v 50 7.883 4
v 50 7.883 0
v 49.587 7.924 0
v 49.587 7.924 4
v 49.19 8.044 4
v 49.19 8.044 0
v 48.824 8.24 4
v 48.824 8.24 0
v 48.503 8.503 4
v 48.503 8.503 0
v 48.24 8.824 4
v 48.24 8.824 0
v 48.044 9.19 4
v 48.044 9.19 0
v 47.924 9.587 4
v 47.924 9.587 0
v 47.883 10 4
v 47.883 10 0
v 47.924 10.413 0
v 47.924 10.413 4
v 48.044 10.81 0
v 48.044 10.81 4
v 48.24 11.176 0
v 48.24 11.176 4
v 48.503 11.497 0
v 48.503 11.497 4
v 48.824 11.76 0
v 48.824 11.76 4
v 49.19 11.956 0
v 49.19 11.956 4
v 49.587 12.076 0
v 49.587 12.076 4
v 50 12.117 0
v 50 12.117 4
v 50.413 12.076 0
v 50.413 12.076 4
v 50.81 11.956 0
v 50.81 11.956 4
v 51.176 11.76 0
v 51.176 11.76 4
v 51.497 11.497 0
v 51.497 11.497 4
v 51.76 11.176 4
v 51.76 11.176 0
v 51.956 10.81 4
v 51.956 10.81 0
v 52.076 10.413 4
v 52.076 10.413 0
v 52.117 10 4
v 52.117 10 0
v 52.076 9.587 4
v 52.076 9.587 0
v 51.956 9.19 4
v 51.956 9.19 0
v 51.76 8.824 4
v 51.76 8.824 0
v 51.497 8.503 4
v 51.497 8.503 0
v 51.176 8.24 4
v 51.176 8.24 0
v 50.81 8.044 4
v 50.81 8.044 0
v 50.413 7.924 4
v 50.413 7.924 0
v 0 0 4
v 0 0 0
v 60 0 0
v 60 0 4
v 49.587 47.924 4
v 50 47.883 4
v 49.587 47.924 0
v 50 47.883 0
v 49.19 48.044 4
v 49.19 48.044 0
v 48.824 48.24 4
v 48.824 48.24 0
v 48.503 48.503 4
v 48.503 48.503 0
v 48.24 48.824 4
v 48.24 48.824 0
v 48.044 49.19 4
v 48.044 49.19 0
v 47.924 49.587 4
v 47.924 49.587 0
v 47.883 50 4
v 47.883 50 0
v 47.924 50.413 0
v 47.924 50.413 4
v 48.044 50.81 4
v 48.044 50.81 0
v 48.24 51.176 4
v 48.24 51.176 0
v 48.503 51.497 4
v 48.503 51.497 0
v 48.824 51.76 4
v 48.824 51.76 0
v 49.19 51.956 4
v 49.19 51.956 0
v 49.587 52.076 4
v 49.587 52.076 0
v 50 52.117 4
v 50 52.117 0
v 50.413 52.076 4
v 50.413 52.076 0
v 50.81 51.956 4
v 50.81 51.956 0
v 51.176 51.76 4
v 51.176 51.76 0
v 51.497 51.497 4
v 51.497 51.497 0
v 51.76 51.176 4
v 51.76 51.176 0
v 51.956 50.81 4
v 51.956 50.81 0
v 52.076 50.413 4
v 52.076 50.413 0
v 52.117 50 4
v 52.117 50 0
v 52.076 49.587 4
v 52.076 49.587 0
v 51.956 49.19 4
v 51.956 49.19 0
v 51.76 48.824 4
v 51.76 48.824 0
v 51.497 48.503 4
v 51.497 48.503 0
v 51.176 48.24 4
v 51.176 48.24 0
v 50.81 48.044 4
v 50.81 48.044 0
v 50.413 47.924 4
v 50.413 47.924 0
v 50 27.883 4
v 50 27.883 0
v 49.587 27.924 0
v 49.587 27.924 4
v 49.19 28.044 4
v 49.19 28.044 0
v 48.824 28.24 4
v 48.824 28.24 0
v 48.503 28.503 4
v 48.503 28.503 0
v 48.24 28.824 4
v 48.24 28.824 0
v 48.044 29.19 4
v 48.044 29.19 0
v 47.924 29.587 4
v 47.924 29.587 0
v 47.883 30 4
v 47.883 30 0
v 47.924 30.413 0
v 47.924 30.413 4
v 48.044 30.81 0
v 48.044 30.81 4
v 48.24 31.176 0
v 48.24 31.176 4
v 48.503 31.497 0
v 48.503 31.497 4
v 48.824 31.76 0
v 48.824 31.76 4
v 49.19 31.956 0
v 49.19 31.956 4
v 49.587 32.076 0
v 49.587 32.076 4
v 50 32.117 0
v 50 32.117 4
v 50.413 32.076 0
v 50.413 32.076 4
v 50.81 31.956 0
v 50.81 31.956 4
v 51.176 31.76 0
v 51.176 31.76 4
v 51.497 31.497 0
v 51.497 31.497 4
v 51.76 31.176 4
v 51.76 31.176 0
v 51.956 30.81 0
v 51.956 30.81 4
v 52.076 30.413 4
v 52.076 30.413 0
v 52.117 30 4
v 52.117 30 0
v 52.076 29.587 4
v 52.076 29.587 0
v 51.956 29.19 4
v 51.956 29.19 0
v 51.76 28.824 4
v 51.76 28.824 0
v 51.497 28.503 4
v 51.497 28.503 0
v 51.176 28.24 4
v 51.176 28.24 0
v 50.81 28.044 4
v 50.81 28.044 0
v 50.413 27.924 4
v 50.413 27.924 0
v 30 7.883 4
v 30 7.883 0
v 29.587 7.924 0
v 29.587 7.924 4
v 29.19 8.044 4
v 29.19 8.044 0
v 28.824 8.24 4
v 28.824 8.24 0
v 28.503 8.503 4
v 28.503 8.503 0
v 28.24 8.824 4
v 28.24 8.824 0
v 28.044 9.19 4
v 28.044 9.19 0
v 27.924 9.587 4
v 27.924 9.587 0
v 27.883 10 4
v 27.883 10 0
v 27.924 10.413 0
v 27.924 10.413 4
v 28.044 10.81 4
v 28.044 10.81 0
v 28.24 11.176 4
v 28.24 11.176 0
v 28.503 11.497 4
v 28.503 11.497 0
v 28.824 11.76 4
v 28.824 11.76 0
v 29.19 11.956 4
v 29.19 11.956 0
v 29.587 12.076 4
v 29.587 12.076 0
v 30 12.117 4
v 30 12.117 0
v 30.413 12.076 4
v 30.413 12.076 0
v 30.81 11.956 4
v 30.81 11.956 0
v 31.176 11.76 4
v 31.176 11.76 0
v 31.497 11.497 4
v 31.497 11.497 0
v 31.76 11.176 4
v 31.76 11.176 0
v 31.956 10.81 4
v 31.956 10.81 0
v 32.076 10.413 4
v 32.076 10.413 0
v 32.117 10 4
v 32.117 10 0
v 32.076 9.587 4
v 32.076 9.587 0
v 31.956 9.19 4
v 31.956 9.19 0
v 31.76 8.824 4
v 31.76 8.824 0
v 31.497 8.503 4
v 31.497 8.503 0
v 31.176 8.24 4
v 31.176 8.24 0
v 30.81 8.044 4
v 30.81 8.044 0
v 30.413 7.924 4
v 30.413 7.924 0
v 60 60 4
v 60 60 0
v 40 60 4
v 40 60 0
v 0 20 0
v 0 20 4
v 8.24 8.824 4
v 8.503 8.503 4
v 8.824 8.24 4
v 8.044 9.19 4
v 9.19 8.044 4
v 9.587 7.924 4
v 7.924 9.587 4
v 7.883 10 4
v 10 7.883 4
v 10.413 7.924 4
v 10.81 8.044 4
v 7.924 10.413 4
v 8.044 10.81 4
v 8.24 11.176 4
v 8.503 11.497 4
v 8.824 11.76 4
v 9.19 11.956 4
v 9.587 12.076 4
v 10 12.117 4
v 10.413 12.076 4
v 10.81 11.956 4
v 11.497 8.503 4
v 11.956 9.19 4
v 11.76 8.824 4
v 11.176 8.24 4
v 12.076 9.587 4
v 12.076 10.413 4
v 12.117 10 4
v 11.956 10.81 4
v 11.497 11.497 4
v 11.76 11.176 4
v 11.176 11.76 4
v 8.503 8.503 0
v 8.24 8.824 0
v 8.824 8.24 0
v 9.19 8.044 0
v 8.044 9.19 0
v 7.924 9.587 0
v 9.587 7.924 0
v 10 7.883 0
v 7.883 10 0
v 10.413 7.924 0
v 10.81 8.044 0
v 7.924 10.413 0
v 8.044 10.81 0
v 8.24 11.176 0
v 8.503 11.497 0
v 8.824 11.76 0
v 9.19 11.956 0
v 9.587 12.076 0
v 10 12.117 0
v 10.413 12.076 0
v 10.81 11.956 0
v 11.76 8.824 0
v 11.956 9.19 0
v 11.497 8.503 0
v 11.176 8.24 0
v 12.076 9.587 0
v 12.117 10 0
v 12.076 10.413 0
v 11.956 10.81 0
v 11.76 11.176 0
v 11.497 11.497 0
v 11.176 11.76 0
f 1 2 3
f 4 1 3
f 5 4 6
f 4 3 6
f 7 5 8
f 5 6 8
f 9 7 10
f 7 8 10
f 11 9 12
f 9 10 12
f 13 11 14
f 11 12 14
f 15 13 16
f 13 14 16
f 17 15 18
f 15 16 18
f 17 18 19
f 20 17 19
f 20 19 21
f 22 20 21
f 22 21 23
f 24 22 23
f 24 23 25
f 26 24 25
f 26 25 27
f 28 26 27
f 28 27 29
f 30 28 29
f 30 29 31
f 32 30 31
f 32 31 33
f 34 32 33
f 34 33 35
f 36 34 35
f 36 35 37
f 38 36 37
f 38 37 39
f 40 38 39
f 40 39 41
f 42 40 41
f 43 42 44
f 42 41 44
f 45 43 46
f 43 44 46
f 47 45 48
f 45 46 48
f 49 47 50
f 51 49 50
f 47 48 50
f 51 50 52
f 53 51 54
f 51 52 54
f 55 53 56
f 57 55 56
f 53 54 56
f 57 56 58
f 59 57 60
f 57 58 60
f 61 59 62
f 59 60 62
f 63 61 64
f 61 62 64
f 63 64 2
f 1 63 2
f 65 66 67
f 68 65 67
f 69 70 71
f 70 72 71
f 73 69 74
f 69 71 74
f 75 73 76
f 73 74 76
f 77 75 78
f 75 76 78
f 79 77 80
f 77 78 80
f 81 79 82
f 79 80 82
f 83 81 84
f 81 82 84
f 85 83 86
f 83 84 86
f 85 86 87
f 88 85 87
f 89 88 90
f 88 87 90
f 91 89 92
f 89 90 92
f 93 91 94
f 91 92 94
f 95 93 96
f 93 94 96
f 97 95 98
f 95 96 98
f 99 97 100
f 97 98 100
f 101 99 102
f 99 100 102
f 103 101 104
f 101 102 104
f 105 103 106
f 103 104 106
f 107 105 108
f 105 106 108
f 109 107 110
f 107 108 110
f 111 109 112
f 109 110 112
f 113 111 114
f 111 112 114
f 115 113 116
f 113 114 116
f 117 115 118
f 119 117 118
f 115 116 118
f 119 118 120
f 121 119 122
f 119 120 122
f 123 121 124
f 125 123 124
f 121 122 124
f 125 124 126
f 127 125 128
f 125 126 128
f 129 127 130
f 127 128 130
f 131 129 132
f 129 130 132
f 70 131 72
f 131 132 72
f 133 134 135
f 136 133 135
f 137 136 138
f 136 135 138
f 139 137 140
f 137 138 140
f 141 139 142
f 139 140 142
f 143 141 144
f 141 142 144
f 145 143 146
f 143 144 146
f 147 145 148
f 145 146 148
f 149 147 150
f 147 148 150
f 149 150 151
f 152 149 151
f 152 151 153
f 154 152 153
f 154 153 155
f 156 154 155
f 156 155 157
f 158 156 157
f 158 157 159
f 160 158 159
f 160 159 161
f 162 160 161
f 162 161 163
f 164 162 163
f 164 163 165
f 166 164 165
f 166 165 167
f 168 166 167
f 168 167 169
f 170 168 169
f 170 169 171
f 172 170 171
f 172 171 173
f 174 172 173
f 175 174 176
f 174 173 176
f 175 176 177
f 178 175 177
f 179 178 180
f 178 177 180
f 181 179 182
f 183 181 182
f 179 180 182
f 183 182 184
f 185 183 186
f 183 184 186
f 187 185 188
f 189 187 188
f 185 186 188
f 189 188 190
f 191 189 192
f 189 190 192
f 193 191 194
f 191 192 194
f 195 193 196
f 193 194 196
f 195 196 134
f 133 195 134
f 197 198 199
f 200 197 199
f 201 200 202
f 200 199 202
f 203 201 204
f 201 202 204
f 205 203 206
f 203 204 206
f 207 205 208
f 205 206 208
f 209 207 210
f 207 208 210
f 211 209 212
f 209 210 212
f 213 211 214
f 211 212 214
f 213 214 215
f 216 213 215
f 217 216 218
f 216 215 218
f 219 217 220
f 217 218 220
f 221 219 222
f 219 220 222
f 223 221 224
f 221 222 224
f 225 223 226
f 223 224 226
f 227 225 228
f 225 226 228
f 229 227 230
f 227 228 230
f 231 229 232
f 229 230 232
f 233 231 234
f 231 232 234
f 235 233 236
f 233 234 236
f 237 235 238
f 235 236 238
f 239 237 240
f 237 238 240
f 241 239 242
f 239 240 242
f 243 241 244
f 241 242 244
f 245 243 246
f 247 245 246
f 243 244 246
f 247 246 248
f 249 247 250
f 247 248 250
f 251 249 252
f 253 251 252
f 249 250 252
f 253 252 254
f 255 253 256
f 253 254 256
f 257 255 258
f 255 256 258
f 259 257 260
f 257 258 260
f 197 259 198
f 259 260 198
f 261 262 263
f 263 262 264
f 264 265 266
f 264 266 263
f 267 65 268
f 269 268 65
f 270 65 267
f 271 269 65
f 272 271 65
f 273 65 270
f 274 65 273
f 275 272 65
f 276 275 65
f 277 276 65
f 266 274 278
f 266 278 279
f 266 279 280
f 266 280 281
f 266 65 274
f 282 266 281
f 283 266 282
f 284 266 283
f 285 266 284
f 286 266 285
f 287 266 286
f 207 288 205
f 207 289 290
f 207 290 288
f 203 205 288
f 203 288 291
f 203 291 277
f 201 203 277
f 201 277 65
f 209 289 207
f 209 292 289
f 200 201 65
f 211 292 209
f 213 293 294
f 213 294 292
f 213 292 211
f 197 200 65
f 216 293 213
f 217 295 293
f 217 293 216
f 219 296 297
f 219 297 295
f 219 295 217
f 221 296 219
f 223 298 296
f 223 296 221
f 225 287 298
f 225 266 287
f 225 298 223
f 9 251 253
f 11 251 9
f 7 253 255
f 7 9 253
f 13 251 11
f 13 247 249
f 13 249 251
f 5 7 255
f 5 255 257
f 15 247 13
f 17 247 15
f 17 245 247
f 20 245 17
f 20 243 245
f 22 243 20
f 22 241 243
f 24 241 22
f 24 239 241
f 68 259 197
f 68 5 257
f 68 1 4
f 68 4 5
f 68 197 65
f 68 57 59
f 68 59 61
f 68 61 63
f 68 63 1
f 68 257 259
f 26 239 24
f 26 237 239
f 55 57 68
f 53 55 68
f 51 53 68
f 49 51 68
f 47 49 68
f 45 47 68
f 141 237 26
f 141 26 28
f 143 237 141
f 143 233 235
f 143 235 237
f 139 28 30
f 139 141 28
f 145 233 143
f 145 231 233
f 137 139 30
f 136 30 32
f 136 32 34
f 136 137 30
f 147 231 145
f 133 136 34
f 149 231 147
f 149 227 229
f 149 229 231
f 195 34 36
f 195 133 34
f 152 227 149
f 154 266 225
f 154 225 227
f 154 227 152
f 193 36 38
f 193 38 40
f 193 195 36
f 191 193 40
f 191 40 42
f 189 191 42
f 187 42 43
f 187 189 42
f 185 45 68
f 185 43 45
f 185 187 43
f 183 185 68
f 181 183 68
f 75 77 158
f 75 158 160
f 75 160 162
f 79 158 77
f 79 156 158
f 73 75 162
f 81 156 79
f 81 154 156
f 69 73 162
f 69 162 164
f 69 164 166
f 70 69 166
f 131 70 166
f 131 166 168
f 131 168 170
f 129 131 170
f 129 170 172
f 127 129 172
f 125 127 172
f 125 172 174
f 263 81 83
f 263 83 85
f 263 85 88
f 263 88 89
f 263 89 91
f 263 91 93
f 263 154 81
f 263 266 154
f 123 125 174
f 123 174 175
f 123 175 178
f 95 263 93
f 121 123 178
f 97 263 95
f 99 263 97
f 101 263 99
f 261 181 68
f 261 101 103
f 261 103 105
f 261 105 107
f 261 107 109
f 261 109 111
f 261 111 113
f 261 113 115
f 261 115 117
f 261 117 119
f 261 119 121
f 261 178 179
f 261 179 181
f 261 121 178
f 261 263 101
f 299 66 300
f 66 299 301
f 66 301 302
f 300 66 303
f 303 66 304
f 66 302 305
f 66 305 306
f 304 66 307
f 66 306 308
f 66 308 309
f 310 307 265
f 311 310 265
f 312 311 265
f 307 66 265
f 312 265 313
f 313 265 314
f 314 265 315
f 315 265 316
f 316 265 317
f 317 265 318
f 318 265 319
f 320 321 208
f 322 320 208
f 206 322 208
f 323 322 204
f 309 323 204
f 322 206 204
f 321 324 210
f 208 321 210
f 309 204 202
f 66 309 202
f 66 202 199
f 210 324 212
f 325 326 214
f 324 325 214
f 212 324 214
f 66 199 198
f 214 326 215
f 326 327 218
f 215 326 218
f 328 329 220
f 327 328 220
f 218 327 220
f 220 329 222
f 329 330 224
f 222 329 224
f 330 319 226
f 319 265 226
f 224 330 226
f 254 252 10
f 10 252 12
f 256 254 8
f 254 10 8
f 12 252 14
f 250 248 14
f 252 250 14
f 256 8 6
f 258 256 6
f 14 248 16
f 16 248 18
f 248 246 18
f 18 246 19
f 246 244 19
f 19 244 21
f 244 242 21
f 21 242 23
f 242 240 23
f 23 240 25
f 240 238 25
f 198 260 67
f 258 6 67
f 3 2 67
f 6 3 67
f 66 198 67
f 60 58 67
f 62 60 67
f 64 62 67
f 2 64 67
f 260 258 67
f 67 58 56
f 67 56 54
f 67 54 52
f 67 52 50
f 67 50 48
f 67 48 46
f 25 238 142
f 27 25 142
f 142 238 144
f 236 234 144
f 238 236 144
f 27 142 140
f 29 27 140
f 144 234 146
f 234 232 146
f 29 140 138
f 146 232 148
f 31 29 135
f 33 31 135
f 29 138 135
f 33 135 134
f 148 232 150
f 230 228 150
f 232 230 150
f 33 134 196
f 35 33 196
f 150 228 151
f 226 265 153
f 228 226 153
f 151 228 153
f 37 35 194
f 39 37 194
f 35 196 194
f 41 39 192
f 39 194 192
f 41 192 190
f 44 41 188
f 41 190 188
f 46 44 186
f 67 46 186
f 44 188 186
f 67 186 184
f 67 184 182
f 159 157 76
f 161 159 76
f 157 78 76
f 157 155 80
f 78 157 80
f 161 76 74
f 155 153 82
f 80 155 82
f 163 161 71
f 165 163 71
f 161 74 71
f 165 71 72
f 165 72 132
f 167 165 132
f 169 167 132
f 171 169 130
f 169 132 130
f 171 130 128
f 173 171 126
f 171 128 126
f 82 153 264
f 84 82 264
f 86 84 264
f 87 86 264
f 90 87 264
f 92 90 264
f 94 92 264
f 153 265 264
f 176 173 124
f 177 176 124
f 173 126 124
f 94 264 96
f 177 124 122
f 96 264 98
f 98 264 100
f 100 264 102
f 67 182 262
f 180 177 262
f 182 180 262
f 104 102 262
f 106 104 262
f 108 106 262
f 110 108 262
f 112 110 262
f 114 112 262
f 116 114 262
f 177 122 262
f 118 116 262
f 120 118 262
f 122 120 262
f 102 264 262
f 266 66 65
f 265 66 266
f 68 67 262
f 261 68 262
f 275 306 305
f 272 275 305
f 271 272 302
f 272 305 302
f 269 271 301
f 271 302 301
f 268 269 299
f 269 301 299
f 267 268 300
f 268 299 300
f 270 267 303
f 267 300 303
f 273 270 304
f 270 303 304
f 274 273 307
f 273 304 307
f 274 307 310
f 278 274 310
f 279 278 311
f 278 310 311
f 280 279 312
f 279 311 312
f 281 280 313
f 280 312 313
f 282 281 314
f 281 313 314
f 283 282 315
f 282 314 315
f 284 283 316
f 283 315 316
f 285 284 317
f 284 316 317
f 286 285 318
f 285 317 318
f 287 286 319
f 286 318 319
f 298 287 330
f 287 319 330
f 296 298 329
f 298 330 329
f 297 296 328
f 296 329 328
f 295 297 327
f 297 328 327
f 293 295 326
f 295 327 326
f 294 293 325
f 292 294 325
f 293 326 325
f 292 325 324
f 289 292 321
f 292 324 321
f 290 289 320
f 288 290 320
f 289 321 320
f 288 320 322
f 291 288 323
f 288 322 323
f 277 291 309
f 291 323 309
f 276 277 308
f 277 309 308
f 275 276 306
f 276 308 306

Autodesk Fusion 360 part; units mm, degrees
sketch "Sketch1" plane through (0, 0, 0) normal (0, 0, 1) x (1, 0, 0)
  line L0 (0, 0) -> (60, 0)
  line L1 (60, 0) -> (60, 60)
  line L2 (60, 60) -> (40, 60)
  line L3 (0, 0) -> (0, 20)
  line L4 (0, 20) -> (40, 60)
  dimension "d1" = 60
  dimension "d2" = 60
  dimension "d3" = 20
  dimension "d4" = 20
extrude "Extrude1" add sketch "Sketch1" along normal blind 4
hole "Hole2" at (10, 10, 4) direction (0, 0, -1) diameter 4.234 depth 34 tip angle 180
hole "Hole3" at (50, 10, 4) direction (0, 0, -1) diameter 4.234 depth 34 tip angle 180
hole "Hole4" at (50, 50, 4) direction (0, 0, -1) diameter 4.234 depth 34 tip angle 180
hole "Hole5" at (50, 30, 4) direction (0, 0, -1) diameter 4.234 depth 34 tip angle 180
hole "Hole6" at (30, 10, 4) direction (0, 0, -1) diameter 4.234 depth 34 tip angle 180
